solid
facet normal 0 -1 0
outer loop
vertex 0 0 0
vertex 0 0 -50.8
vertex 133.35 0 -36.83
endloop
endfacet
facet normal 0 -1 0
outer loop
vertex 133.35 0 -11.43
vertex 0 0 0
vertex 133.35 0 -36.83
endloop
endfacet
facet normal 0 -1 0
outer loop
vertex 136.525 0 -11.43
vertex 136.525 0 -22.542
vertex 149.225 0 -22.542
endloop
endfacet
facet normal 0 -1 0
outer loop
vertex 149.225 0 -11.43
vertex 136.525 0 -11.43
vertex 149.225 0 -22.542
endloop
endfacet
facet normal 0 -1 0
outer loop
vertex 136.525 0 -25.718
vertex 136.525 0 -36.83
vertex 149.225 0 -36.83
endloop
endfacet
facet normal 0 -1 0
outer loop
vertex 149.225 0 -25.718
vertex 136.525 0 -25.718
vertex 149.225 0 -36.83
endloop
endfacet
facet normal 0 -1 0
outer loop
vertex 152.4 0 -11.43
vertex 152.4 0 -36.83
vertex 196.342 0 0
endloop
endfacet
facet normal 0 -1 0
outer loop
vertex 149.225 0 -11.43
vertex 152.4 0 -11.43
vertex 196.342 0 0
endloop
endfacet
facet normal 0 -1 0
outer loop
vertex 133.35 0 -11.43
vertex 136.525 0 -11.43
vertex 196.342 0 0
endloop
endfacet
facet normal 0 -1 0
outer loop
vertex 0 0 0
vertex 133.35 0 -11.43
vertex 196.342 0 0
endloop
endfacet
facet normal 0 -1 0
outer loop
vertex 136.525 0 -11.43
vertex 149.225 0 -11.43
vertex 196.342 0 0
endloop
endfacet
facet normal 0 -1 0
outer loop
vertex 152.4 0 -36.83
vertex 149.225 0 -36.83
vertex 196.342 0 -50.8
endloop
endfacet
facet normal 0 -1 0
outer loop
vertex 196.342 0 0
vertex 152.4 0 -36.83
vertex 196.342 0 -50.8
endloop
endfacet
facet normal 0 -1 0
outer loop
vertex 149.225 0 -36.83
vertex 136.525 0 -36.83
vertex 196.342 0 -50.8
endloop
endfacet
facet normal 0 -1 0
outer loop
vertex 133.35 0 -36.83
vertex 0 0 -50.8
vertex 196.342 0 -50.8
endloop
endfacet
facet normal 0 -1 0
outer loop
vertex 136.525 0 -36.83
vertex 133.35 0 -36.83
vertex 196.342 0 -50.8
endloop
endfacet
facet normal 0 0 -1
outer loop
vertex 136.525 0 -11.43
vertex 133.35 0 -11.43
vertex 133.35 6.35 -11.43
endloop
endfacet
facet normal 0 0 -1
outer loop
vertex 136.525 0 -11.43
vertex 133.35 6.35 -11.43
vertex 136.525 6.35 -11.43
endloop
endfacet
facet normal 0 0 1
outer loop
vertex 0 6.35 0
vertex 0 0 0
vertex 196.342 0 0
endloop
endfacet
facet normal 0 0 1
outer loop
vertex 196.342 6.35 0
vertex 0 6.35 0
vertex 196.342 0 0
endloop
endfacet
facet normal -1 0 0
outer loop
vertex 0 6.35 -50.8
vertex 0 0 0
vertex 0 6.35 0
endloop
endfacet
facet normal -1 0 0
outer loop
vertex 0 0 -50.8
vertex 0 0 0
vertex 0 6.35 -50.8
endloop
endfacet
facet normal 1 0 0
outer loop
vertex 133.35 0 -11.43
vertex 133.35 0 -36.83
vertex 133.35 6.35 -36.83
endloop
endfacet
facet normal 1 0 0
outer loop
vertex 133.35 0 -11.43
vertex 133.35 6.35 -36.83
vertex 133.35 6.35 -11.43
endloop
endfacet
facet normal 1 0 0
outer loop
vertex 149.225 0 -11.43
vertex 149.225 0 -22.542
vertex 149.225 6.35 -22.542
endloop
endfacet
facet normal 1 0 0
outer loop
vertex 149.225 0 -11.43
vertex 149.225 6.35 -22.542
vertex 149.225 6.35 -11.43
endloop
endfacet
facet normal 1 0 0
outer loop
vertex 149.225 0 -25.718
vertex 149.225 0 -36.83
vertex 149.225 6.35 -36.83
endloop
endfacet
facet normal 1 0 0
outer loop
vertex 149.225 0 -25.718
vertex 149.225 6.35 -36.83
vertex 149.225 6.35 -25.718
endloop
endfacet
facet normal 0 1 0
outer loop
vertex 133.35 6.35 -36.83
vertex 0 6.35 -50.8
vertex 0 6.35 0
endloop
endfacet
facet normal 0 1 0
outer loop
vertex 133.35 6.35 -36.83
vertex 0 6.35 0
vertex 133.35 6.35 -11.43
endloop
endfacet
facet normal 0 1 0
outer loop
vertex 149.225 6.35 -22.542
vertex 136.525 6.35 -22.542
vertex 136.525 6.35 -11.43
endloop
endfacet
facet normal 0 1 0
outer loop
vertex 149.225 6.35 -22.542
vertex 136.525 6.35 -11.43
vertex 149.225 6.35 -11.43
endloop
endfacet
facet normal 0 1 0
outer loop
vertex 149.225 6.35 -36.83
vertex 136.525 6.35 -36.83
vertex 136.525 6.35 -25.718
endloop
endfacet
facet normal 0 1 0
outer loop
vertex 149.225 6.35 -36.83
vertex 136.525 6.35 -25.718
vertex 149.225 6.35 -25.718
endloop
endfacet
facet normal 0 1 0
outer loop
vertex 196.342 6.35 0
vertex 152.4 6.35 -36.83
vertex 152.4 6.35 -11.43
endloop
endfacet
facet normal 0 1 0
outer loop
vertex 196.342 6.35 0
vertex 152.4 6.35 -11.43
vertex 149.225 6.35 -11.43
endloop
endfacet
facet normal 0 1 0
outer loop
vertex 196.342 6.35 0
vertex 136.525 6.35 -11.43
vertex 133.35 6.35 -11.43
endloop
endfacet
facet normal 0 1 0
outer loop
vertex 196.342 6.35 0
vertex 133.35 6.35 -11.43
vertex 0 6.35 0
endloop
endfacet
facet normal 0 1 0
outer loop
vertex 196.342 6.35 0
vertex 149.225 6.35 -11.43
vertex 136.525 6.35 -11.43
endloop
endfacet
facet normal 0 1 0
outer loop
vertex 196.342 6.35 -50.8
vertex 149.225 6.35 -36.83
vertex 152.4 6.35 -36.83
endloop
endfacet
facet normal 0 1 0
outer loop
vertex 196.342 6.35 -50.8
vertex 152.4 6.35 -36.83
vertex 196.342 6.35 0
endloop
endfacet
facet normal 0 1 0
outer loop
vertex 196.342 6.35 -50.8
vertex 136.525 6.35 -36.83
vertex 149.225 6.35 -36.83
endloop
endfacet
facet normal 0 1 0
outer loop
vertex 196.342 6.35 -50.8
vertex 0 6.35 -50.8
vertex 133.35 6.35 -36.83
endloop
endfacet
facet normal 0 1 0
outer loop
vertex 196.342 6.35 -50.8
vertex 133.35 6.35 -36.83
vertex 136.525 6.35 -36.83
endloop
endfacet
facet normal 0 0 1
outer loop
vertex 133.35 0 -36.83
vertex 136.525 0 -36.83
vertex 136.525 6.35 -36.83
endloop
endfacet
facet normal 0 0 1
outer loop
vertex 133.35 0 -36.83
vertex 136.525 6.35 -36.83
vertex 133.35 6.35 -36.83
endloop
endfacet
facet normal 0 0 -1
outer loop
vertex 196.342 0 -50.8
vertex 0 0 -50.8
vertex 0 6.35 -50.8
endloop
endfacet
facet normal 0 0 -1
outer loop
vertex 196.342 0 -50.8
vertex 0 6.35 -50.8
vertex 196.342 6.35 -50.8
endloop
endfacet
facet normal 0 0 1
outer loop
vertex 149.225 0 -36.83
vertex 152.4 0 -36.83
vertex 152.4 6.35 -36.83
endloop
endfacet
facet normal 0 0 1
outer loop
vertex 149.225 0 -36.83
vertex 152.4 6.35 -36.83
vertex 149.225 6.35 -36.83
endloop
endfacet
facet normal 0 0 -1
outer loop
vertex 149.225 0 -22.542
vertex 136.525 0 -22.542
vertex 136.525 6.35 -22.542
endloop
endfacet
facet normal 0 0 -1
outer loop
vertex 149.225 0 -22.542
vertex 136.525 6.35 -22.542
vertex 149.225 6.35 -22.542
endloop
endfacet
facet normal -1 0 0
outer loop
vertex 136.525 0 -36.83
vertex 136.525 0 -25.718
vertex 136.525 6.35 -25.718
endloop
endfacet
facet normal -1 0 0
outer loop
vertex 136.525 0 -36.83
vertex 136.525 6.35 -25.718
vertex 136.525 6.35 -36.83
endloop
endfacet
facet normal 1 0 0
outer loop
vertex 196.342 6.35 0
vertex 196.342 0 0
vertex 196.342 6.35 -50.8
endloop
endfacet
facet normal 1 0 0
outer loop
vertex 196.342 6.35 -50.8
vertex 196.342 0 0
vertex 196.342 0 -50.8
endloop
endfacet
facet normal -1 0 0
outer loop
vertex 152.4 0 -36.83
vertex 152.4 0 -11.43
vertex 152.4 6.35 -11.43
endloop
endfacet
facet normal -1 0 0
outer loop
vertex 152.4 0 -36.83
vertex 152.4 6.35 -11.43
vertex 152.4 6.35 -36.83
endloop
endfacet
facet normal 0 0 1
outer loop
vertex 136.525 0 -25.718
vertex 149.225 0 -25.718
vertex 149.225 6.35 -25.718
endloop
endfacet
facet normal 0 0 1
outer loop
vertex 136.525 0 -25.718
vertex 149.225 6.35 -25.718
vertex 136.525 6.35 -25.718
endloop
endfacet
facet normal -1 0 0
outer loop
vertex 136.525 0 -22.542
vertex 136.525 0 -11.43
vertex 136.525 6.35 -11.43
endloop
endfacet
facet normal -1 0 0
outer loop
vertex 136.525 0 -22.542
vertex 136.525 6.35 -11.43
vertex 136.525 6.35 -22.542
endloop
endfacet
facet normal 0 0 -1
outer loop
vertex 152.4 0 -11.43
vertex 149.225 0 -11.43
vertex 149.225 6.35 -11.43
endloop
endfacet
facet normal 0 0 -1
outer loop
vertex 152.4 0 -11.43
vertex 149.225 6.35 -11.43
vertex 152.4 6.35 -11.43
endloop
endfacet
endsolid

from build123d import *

# Parameters (mm, degrees)
SKETCH1_W           = 196.342
SKETCH1_H           = 50.8
BOSS_EXTRUDE1_DEPTH = 6.35
CUT_EXTRUDE1_DEPTH  = 7.62


with BuildPart() as part:
    # Sketch1 → Boss-Extrude1 (new body)
    with BuildSketch(Plane(origin=(0, 0, 0), x_dir=(1, 0, 0), z_dir=(0, 1, 0))):
        with Locations((98.171, 25.4)):
            Rectangle(SKETCH1_W, SKETCH1_H)
    extrude(amount=BOSS_EXTRUDE1_DEPTH)

    # Sketch2 → Cut-Extrude1 (cut)
    with BuildSketch(Plane.XZ):
        Polygon((136.525, -25.7175), (136.525, -36.83), (133.35, -36.83), (133.35, -11.43), (136.525, -11.43), (136.525, -22.5425), (149.225, -22.5425), (149.225, -11.43), (152.4, -11.43), (152.4, -36.83), (149.225, -36.83), (149.225, -25.7175), align=None)
    extrude(amount=-CUT_EXTRUDE1_DEPTH, mode=Mode.SUBTRACT)


solid = part.part
